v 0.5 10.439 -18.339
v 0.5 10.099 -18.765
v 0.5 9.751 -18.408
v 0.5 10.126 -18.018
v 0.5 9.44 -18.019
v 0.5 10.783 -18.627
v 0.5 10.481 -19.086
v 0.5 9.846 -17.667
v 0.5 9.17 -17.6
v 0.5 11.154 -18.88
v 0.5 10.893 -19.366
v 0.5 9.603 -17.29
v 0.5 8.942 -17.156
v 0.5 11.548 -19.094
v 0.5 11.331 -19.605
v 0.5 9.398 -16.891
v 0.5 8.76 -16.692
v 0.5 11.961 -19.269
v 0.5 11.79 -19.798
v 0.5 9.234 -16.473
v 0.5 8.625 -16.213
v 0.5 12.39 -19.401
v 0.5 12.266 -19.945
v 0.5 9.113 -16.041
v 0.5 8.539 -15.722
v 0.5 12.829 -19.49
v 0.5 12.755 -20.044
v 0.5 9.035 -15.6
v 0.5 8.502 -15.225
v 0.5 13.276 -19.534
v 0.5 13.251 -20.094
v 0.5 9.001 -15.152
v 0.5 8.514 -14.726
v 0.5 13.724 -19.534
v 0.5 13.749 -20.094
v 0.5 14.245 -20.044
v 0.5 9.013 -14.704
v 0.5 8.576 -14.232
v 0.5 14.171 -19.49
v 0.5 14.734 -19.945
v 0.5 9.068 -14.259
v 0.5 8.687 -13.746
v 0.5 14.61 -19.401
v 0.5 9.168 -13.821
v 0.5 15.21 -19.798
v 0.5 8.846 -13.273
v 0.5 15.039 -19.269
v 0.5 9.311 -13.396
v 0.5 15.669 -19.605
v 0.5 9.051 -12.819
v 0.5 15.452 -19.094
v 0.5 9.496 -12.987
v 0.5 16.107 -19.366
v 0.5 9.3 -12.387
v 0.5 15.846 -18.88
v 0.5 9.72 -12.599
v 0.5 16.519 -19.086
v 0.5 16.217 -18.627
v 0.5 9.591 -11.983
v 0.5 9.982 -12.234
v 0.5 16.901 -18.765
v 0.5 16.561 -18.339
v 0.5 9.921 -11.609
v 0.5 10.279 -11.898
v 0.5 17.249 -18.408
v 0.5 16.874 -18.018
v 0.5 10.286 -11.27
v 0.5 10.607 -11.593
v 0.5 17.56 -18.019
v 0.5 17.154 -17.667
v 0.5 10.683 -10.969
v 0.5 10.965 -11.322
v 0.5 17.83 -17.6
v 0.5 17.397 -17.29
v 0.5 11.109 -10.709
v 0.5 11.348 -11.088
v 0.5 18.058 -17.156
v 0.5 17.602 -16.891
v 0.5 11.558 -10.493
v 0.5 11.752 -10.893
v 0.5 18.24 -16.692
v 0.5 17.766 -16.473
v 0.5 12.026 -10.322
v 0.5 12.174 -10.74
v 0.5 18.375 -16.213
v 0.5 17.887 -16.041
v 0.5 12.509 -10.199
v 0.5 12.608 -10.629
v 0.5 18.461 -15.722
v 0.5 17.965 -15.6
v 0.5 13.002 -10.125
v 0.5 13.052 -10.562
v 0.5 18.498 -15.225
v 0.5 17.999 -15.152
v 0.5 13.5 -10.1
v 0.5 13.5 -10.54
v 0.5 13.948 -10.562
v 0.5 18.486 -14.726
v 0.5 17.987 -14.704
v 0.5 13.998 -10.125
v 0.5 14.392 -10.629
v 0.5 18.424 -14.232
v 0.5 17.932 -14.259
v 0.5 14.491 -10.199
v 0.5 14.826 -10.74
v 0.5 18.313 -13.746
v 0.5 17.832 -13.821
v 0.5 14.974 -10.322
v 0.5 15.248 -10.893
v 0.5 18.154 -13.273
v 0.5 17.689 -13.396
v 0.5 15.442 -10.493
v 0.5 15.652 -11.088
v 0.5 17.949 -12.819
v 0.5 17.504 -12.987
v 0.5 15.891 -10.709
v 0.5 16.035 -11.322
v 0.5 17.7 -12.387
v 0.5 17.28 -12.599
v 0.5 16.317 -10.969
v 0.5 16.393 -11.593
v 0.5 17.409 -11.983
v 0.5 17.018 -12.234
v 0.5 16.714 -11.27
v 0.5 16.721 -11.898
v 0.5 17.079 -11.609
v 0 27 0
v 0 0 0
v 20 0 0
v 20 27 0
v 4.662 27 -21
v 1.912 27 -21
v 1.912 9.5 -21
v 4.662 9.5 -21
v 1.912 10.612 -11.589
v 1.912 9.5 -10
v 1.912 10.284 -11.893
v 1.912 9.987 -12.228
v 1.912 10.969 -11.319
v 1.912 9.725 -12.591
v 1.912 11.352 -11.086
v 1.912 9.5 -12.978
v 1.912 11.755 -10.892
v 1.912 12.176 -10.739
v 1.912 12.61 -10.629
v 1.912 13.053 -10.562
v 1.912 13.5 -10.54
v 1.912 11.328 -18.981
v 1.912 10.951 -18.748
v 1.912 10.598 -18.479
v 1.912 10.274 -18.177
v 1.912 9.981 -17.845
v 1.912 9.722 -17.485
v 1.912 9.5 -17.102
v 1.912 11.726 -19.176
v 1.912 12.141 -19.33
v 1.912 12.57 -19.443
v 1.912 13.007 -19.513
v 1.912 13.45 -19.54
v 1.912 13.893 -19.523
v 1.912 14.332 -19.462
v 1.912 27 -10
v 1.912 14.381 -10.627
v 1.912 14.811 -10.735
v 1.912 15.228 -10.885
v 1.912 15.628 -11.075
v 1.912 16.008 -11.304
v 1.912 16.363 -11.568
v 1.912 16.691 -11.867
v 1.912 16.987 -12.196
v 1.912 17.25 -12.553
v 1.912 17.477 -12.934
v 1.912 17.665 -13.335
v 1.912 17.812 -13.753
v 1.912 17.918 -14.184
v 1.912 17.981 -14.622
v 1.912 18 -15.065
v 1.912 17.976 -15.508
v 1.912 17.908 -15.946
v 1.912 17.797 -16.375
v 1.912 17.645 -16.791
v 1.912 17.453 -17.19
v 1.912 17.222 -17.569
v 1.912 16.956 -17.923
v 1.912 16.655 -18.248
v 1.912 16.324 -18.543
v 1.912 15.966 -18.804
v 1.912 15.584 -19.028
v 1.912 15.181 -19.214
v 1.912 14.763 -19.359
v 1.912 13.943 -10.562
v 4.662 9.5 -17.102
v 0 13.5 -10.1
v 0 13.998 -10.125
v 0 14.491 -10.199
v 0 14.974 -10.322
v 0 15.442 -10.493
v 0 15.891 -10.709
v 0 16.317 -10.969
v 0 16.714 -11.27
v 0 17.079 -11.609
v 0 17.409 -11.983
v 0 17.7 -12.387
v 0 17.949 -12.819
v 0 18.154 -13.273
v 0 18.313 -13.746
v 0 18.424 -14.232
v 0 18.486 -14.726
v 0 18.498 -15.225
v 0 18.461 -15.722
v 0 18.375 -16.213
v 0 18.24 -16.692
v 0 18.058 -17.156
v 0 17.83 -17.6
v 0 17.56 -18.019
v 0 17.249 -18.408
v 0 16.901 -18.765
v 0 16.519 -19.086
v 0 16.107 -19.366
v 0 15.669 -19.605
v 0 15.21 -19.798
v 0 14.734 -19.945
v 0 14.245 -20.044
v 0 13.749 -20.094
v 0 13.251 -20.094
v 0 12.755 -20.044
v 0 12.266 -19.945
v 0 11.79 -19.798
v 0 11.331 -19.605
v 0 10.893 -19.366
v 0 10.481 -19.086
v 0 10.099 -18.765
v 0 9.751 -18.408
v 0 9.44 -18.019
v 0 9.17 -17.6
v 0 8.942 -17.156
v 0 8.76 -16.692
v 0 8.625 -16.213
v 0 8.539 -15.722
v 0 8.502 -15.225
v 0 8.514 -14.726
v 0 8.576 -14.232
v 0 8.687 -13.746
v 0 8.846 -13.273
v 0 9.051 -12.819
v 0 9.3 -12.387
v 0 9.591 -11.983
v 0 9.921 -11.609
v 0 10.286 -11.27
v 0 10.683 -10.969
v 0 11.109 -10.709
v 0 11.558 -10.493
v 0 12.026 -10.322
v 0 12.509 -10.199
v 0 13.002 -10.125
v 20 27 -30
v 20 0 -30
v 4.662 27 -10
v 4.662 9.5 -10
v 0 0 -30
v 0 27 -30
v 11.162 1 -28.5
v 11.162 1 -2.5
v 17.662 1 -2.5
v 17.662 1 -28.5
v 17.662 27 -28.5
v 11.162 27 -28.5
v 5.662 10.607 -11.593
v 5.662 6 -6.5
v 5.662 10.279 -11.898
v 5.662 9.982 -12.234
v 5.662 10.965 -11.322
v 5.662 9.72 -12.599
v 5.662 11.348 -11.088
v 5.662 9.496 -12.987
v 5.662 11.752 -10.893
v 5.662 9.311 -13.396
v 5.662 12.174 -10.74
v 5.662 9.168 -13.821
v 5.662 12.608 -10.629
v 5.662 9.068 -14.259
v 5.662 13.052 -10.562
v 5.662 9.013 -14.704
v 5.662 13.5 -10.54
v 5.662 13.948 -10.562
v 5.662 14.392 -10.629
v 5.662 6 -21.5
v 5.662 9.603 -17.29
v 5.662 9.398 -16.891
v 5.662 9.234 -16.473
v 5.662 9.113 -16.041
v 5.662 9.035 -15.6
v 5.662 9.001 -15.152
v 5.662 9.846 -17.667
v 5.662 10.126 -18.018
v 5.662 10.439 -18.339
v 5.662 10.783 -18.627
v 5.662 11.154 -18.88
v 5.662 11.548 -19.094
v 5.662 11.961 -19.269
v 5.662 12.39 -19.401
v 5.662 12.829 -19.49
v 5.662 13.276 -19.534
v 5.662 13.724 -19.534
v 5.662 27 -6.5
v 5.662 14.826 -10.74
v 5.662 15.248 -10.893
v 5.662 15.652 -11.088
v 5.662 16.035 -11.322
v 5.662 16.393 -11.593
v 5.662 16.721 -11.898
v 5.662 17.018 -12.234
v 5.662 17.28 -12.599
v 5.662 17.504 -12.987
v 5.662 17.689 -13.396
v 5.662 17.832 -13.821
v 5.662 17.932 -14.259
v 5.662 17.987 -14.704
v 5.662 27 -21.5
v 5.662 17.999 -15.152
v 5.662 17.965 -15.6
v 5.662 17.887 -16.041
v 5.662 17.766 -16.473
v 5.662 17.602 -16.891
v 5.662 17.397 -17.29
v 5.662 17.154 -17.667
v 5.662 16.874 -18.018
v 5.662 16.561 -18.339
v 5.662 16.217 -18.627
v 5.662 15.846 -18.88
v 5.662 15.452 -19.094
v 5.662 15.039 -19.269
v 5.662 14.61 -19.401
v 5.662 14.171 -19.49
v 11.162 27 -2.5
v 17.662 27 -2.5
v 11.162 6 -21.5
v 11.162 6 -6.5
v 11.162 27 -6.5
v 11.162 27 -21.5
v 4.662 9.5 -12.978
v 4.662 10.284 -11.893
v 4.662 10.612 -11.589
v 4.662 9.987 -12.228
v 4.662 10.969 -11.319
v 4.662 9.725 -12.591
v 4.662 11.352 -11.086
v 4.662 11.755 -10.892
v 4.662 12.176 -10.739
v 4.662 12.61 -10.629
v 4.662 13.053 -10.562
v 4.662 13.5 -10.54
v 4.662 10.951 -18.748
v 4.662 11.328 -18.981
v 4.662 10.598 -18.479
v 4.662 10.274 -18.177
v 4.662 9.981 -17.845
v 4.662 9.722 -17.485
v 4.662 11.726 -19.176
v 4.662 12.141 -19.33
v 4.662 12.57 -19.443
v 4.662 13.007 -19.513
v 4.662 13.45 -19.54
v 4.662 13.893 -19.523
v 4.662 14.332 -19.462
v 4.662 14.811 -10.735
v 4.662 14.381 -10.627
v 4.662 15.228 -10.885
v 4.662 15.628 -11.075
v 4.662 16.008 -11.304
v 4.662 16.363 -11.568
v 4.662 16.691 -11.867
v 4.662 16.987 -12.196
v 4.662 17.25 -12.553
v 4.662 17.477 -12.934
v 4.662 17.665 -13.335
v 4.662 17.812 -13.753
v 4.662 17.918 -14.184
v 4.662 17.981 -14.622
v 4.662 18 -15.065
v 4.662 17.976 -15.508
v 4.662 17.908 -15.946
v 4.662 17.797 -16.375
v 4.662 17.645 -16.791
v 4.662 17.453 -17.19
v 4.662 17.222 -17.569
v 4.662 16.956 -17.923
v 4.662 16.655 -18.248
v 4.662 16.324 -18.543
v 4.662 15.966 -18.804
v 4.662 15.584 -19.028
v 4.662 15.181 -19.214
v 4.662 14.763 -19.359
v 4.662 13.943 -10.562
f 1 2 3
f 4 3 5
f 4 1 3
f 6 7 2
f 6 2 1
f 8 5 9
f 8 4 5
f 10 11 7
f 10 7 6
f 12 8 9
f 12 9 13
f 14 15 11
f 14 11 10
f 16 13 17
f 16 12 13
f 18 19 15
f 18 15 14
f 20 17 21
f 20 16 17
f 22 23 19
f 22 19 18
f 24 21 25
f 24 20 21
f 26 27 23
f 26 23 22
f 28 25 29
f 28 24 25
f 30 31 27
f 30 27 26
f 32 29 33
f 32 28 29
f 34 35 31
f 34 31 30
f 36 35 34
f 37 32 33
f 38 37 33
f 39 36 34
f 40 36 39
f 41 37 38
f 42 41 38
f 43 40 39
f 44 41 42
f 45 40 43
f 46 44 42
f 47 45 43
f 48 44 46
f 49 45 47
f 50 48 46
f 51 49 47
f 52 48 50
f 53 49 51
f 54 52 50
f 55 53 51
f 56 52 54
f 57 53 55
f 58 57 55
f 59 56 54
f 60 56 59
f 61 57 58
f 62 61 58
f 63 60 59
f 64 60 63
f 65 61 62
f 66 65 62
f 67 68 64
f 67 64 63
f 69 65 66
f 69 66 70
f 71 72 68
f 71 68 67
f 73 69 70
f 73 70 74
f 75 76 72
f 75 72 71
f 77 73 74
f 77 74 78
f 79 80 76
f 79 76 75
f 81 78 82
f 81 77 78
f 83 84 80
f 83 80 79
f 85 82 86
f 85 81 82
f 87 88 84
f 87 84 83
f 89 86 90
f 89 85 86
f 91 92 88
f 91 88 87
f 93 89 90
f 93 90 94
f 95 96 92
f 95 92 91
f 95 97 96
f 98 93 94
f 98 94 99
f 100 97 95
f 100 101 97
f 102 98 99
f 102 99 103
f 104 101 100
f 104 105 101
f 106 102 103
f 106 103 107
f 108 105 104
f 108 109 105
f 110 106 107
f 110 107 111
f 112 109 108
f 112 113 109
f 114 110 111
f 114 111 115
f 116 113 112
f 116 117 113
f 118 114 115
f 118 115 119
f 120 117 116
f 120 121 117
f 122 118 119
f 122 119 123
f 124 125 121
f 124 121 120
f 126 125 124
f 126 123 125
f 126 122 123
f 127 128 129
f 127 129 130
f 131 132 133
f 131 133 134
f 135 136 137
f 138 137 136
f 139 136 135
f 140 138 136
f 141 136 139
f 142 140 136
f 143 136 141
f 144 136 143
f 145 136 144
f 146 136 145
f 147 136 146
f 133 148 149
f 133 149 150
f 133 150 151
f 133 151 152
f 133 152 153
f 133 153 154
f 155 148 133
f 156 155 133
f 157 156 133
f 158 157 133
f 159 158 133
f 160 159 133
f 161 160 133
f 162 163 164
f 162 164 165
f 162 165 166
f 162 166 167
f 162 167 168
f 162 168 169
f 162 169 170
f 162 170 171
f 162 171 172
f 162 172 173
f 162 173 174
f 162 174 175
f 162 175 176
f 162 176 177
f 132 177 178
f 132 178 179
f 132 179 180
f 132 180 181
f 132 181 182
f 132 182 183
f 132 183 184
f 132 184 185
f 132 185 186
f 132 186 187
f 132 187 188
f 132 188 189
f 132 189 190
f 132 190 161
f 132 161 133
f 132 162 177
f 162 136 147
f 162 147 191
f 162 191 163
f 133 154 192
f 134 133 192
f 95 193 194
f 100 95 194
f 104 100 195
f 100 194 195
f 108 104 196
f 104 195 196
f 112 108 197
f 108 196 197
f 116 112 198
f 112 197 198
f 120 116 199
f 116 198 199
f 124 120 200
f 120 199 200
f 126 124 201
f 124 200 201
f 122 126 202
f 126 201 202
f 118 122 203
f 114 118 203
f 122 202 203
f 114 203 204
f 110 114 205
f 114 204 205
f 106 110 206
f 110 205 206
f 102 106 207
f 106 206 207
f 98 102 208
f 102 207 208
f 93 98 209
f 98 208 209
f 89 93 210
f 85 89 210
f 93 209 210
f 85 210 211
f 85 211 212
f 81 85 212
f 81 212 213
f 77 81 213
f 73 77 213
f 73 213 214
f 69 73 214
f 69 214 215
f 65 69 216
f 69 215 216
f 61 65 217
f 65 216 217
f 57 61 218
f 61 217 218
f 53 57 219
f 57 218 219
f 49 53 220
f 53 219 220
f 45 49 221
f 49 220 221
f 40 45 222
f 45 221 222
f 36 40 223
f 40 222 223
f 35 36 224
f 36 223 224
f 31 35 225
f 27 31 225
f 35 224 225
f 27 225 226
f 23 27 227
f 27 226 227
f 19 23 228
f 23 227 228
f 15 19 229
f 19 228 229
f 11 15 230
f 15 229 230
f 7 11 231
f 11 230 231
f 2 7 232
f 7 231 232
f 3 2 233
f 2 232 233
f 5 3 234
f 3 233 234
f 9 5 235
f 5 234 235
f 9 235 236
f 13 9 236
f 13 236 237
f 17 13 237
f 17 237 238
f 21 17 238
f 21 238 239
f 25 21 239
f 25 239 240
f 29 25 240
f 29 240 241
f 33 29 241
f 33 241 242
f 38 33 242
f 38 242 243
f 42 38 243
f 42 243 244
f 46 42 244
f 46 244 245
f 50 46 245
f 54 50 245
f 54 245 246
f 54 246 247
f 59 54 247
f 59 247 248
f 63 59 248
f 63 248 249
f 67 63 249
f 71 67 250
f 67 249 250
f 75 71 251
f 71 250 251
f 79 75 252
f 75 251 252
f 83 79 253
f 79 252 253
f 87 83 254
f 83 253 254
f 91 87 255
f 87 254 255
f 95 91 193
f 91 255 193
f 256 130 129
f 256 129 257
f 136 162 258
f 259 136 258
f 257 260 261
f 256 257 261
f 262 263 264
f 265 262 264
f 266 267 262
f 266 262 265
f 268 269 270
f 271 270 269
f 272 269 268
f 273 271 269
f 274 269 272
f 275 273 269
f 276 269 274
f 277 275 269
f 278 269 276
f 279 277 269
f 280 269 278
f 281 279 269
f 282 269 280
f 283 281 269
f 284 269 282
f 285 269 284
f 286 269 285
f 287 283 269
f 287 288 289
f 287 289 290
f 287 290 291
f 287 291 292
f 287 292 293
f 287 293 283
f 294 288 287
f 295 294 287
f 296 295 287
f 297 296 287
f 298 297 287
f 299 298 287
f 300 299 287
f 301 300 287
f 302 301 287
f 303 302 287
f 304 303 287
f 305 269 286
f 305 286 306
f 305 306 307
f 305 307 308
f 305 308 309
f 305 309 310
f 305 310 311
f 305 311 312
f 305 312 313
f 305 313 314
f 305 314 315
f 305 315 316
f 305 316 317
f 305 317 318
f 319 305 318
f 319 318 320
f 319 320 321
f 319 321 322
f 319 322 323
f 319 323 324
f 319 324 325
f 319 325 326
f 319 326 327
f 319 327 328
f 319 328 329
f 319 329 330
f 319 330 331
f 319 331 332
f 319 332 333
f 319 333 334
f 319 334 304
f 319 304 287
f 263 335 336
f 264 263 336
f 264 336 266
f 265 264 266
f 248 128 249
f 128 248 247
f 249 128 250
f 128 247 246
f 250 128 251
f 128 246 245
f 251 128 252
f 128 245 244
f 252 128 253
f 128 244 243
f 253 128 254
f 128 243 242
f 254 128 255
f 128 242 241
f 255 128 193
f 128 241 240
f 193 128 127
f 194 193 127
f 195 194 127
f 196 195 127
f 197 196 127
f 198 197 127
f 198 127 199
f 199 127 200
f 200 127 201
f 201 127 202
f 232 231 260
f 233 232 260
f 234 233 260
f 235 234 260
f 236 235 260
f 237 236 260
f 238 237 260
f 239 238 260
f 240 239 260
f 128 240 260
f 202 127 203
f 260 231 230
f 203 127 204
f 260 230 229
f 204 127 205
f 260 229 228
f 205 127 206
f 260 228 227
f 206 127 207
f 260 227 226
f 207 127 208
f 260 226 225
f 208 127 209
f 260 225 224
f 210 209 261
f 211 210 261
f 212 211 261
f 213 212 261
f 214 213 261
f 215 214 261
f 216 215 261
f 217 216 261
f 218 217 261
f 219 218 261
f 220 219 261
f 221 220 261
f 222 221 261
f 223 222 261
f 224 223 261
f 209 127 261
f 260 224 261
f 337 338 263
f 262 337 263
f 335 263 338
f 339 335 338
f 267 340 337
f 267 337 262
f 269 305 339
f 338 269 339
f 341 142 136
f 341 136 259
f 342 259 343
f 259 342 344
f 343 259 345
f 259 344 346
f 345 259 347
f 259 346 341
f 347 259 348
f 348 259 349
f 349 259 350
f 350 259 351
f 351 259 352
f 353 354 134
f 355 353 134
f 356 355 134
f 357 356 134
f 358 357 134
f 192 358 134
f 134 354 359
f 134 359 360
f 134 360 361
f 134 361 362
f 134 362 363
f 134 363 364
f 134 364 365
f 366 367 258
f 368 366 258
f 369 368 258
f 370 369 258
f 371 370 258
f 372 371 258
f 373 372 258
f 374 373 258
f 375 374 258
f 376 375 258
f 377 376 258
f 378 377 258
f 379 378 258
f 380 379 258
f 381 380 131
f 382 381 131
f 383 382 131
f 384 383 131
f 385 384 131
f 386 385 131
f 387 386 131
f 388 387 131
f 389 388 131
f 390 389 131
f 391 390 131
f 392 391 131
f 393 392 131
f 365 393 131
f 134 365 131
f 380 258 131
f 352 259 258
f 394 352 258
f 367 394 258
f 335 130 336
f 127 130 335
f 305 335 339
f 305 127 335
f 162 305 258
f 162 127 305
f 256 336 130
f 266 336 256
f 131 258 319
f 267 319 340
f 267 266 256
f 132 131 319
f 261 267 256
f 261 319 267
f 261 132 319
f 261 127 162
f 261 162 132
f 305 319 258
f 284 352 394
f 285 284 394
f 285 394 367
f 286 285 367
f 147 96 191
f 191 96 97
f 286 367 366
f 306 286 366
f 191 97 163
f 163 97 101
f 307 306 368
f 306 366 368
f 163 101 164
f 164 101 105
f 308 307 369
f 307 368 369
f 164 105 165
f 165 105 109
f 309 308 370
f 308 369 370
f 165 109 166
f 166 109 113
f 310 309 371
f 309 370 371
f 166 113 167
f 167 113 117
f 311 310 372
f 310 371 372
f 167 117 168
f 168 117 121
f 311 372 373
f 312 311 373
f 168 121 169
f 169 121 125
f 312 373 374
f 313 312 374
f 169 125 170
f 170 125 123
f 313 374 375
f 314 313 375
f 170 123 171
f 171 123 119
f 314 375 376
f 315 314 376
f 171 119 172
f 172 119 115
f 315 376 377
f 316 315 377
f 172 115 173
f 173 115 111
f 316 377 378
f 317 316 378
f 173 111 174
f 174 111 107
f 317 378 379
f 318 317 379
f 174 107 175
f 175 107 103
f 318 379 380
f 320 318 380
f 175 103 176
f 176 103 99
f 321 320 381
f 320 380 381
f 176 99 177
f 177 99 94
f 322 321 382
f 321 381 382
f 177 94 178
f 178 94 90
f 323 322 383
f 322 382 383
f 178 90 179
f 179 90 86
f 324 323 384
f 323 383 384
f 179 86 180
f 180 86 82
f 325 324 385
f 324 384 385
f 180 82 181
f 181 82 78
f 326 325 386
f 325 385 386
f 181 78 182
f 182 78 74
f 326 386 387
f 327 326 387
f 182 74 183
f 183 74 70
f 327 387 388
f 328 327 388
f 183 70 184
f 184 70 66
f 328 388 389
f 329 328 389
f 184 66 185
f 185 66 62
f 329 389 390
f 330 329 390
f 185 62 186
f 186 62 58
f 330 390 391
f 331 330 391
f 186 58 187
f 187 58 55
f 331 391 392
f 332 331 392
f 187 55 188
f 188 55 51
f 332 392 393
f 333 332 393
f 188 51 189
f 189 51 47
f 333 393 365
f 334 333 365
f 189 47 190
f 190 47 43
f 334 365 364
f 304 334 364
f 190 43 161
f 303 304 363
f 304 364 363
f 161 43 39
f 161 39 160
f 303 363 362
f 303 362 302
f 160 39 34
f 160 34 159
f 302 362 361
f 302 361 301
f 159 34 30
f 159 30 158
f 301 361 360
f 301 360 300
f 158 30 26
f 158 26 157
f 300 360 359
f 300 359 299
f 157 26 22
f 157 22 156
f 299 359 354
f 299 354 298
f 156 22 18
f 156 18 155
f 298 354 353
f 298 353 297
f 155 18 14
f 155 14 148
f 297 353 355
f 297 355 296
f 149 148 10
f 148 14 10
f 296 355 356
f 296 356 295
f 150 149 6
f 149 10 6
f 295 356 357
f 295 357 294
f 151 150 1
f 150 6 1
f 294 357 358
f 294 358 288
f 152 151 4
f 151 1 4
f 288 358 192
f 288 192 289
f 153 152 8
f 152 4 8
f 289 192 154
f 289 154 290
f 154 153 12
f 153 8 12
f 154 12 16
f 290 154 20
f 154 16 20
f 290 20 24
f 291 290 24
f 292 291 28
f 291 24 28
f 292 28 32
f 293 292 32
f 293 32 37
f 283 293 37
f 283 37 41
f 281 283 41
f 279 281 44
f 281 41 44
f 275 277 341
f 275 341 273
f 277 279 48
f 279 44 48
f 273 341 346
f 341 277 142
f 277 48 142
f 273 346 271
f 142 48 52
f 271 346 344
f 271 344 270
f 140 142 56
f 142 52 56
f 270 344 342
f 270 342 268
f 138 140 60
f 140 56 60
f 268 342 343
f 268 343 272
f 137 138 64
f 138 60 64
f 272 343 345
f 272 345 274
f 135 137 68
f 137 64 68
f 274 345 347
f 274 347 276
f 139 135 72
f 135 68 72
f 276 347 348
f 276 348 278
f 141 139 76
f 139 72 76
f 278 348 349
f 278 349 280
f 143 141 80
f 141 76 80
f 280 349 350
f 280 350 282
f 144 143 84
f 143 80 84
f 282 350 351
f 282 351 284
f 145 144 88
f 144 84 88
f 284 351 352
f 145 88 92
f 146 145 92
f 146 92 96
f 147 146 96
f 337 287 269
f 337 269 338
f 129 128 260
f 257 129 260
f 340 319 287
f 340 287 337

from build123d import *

# Parameters (mm, degrees)
SKETCH2_W           = 30
SKETCH2_H           = 27
BOSS_EXTRUDE1_DEPTH = 20
SKETCH6_W           = 6.5
SKETCH6_H           = 26
CUT_EXTRUDE4_DEPTH  = 26
SKETCH9_W           = 5.5
SKETCH9_H           = 15
CUT_EXTRUDE5_DEPTH  = 21
SKETCH11_R          = 5
CUT_EXTRUDE8_DEPTH  = 0.5
SKETCH12_W          = 2.75
SKETCH12_H          = 11
CUT_EXTRUDE12_DEPTH = 17.5
SKETCH15_R          = 4.5
CUT_EXTRUDE13_DEPTH = 6


with BuildPart() as part:
    # Sketch2 → Boss-Extrude1 (new body)
    with BuildSketch(Plane(origin=(0, 0, 0), x_dir=(0, 0, -1), z_dir=(1, 0, 0))):
        with Locations((15, 13.5)):
            Rectangle(SKETCH2_W, SKETCH2_H)
    extrude(amount=BOSS_EXTRUDE1_DEPTH)

    # Sketch6 → Cut-Extrude4 (cut)
    with BuildSketch(Plane(origin=(2.296116437, 27, -0.293484995), x_dir=(1, 0, 0), z_dir=(0, 1, 0))):
        with Locations((12.115844825, 15.206515005)):
            Rectangle(SKETCH6_W, SKETCH6_H)
    extrude(amount=-CUT_EXTRUDE4_DEPTH, mode=Mode.SUBTRACT)

    # Sketch9 → Cut-Extrude5 (cut)
    with BuildSketch(Plane(origin=(0, 27, 0), x_dir=(1, 0, 0), z_dir=(0, 1, 0))):
        with Locations((8.411961261, 14)):
            Rectangle(SKETCH9_W, SKETCH9_H)
    extrude(amount=-CUT_EXTRUDE5_DEPTH, mode=Mode.SUBTRACT)

    # Sketch11 → Cut-Extrude8 (cut)
    with BuildSketch(Plane.ZY):
        with Locations((-15.1, 13.5)):
            Circle(SKETCH11_R)
    extrude(amount=-CUT_EXTRUDE8_DEPTH, mode=Mode.SUBTRACT)

    # Sketch12 → Cut-Extrude12 (cut)
    with BuildSketch(Plane(origin=(0, 27, 0), x_dir=(1, 0, 0), z_dir=(0, 1, 0))):
        with Locations((3.286961261, 15.5)):
            Rectangle(SKETCH12_W, SKETCH12_H)
    extrude(amount=-CUT_EXTRUDE12_DEPTH, mode=Mode.SUBTRACT)

    # Sketch15 → Cut-Extrude13 (cut)
    with BuildSketch(Plane.ZY.offset(-0.5)):
        with Locations((-15.04, 13.5)):
            Circle(SKETCH15_R)
    extrude(amount=-CUT_EXTRUDE13_DEPTH, mode=Mode.SUBTRACT)


solid = part.part
